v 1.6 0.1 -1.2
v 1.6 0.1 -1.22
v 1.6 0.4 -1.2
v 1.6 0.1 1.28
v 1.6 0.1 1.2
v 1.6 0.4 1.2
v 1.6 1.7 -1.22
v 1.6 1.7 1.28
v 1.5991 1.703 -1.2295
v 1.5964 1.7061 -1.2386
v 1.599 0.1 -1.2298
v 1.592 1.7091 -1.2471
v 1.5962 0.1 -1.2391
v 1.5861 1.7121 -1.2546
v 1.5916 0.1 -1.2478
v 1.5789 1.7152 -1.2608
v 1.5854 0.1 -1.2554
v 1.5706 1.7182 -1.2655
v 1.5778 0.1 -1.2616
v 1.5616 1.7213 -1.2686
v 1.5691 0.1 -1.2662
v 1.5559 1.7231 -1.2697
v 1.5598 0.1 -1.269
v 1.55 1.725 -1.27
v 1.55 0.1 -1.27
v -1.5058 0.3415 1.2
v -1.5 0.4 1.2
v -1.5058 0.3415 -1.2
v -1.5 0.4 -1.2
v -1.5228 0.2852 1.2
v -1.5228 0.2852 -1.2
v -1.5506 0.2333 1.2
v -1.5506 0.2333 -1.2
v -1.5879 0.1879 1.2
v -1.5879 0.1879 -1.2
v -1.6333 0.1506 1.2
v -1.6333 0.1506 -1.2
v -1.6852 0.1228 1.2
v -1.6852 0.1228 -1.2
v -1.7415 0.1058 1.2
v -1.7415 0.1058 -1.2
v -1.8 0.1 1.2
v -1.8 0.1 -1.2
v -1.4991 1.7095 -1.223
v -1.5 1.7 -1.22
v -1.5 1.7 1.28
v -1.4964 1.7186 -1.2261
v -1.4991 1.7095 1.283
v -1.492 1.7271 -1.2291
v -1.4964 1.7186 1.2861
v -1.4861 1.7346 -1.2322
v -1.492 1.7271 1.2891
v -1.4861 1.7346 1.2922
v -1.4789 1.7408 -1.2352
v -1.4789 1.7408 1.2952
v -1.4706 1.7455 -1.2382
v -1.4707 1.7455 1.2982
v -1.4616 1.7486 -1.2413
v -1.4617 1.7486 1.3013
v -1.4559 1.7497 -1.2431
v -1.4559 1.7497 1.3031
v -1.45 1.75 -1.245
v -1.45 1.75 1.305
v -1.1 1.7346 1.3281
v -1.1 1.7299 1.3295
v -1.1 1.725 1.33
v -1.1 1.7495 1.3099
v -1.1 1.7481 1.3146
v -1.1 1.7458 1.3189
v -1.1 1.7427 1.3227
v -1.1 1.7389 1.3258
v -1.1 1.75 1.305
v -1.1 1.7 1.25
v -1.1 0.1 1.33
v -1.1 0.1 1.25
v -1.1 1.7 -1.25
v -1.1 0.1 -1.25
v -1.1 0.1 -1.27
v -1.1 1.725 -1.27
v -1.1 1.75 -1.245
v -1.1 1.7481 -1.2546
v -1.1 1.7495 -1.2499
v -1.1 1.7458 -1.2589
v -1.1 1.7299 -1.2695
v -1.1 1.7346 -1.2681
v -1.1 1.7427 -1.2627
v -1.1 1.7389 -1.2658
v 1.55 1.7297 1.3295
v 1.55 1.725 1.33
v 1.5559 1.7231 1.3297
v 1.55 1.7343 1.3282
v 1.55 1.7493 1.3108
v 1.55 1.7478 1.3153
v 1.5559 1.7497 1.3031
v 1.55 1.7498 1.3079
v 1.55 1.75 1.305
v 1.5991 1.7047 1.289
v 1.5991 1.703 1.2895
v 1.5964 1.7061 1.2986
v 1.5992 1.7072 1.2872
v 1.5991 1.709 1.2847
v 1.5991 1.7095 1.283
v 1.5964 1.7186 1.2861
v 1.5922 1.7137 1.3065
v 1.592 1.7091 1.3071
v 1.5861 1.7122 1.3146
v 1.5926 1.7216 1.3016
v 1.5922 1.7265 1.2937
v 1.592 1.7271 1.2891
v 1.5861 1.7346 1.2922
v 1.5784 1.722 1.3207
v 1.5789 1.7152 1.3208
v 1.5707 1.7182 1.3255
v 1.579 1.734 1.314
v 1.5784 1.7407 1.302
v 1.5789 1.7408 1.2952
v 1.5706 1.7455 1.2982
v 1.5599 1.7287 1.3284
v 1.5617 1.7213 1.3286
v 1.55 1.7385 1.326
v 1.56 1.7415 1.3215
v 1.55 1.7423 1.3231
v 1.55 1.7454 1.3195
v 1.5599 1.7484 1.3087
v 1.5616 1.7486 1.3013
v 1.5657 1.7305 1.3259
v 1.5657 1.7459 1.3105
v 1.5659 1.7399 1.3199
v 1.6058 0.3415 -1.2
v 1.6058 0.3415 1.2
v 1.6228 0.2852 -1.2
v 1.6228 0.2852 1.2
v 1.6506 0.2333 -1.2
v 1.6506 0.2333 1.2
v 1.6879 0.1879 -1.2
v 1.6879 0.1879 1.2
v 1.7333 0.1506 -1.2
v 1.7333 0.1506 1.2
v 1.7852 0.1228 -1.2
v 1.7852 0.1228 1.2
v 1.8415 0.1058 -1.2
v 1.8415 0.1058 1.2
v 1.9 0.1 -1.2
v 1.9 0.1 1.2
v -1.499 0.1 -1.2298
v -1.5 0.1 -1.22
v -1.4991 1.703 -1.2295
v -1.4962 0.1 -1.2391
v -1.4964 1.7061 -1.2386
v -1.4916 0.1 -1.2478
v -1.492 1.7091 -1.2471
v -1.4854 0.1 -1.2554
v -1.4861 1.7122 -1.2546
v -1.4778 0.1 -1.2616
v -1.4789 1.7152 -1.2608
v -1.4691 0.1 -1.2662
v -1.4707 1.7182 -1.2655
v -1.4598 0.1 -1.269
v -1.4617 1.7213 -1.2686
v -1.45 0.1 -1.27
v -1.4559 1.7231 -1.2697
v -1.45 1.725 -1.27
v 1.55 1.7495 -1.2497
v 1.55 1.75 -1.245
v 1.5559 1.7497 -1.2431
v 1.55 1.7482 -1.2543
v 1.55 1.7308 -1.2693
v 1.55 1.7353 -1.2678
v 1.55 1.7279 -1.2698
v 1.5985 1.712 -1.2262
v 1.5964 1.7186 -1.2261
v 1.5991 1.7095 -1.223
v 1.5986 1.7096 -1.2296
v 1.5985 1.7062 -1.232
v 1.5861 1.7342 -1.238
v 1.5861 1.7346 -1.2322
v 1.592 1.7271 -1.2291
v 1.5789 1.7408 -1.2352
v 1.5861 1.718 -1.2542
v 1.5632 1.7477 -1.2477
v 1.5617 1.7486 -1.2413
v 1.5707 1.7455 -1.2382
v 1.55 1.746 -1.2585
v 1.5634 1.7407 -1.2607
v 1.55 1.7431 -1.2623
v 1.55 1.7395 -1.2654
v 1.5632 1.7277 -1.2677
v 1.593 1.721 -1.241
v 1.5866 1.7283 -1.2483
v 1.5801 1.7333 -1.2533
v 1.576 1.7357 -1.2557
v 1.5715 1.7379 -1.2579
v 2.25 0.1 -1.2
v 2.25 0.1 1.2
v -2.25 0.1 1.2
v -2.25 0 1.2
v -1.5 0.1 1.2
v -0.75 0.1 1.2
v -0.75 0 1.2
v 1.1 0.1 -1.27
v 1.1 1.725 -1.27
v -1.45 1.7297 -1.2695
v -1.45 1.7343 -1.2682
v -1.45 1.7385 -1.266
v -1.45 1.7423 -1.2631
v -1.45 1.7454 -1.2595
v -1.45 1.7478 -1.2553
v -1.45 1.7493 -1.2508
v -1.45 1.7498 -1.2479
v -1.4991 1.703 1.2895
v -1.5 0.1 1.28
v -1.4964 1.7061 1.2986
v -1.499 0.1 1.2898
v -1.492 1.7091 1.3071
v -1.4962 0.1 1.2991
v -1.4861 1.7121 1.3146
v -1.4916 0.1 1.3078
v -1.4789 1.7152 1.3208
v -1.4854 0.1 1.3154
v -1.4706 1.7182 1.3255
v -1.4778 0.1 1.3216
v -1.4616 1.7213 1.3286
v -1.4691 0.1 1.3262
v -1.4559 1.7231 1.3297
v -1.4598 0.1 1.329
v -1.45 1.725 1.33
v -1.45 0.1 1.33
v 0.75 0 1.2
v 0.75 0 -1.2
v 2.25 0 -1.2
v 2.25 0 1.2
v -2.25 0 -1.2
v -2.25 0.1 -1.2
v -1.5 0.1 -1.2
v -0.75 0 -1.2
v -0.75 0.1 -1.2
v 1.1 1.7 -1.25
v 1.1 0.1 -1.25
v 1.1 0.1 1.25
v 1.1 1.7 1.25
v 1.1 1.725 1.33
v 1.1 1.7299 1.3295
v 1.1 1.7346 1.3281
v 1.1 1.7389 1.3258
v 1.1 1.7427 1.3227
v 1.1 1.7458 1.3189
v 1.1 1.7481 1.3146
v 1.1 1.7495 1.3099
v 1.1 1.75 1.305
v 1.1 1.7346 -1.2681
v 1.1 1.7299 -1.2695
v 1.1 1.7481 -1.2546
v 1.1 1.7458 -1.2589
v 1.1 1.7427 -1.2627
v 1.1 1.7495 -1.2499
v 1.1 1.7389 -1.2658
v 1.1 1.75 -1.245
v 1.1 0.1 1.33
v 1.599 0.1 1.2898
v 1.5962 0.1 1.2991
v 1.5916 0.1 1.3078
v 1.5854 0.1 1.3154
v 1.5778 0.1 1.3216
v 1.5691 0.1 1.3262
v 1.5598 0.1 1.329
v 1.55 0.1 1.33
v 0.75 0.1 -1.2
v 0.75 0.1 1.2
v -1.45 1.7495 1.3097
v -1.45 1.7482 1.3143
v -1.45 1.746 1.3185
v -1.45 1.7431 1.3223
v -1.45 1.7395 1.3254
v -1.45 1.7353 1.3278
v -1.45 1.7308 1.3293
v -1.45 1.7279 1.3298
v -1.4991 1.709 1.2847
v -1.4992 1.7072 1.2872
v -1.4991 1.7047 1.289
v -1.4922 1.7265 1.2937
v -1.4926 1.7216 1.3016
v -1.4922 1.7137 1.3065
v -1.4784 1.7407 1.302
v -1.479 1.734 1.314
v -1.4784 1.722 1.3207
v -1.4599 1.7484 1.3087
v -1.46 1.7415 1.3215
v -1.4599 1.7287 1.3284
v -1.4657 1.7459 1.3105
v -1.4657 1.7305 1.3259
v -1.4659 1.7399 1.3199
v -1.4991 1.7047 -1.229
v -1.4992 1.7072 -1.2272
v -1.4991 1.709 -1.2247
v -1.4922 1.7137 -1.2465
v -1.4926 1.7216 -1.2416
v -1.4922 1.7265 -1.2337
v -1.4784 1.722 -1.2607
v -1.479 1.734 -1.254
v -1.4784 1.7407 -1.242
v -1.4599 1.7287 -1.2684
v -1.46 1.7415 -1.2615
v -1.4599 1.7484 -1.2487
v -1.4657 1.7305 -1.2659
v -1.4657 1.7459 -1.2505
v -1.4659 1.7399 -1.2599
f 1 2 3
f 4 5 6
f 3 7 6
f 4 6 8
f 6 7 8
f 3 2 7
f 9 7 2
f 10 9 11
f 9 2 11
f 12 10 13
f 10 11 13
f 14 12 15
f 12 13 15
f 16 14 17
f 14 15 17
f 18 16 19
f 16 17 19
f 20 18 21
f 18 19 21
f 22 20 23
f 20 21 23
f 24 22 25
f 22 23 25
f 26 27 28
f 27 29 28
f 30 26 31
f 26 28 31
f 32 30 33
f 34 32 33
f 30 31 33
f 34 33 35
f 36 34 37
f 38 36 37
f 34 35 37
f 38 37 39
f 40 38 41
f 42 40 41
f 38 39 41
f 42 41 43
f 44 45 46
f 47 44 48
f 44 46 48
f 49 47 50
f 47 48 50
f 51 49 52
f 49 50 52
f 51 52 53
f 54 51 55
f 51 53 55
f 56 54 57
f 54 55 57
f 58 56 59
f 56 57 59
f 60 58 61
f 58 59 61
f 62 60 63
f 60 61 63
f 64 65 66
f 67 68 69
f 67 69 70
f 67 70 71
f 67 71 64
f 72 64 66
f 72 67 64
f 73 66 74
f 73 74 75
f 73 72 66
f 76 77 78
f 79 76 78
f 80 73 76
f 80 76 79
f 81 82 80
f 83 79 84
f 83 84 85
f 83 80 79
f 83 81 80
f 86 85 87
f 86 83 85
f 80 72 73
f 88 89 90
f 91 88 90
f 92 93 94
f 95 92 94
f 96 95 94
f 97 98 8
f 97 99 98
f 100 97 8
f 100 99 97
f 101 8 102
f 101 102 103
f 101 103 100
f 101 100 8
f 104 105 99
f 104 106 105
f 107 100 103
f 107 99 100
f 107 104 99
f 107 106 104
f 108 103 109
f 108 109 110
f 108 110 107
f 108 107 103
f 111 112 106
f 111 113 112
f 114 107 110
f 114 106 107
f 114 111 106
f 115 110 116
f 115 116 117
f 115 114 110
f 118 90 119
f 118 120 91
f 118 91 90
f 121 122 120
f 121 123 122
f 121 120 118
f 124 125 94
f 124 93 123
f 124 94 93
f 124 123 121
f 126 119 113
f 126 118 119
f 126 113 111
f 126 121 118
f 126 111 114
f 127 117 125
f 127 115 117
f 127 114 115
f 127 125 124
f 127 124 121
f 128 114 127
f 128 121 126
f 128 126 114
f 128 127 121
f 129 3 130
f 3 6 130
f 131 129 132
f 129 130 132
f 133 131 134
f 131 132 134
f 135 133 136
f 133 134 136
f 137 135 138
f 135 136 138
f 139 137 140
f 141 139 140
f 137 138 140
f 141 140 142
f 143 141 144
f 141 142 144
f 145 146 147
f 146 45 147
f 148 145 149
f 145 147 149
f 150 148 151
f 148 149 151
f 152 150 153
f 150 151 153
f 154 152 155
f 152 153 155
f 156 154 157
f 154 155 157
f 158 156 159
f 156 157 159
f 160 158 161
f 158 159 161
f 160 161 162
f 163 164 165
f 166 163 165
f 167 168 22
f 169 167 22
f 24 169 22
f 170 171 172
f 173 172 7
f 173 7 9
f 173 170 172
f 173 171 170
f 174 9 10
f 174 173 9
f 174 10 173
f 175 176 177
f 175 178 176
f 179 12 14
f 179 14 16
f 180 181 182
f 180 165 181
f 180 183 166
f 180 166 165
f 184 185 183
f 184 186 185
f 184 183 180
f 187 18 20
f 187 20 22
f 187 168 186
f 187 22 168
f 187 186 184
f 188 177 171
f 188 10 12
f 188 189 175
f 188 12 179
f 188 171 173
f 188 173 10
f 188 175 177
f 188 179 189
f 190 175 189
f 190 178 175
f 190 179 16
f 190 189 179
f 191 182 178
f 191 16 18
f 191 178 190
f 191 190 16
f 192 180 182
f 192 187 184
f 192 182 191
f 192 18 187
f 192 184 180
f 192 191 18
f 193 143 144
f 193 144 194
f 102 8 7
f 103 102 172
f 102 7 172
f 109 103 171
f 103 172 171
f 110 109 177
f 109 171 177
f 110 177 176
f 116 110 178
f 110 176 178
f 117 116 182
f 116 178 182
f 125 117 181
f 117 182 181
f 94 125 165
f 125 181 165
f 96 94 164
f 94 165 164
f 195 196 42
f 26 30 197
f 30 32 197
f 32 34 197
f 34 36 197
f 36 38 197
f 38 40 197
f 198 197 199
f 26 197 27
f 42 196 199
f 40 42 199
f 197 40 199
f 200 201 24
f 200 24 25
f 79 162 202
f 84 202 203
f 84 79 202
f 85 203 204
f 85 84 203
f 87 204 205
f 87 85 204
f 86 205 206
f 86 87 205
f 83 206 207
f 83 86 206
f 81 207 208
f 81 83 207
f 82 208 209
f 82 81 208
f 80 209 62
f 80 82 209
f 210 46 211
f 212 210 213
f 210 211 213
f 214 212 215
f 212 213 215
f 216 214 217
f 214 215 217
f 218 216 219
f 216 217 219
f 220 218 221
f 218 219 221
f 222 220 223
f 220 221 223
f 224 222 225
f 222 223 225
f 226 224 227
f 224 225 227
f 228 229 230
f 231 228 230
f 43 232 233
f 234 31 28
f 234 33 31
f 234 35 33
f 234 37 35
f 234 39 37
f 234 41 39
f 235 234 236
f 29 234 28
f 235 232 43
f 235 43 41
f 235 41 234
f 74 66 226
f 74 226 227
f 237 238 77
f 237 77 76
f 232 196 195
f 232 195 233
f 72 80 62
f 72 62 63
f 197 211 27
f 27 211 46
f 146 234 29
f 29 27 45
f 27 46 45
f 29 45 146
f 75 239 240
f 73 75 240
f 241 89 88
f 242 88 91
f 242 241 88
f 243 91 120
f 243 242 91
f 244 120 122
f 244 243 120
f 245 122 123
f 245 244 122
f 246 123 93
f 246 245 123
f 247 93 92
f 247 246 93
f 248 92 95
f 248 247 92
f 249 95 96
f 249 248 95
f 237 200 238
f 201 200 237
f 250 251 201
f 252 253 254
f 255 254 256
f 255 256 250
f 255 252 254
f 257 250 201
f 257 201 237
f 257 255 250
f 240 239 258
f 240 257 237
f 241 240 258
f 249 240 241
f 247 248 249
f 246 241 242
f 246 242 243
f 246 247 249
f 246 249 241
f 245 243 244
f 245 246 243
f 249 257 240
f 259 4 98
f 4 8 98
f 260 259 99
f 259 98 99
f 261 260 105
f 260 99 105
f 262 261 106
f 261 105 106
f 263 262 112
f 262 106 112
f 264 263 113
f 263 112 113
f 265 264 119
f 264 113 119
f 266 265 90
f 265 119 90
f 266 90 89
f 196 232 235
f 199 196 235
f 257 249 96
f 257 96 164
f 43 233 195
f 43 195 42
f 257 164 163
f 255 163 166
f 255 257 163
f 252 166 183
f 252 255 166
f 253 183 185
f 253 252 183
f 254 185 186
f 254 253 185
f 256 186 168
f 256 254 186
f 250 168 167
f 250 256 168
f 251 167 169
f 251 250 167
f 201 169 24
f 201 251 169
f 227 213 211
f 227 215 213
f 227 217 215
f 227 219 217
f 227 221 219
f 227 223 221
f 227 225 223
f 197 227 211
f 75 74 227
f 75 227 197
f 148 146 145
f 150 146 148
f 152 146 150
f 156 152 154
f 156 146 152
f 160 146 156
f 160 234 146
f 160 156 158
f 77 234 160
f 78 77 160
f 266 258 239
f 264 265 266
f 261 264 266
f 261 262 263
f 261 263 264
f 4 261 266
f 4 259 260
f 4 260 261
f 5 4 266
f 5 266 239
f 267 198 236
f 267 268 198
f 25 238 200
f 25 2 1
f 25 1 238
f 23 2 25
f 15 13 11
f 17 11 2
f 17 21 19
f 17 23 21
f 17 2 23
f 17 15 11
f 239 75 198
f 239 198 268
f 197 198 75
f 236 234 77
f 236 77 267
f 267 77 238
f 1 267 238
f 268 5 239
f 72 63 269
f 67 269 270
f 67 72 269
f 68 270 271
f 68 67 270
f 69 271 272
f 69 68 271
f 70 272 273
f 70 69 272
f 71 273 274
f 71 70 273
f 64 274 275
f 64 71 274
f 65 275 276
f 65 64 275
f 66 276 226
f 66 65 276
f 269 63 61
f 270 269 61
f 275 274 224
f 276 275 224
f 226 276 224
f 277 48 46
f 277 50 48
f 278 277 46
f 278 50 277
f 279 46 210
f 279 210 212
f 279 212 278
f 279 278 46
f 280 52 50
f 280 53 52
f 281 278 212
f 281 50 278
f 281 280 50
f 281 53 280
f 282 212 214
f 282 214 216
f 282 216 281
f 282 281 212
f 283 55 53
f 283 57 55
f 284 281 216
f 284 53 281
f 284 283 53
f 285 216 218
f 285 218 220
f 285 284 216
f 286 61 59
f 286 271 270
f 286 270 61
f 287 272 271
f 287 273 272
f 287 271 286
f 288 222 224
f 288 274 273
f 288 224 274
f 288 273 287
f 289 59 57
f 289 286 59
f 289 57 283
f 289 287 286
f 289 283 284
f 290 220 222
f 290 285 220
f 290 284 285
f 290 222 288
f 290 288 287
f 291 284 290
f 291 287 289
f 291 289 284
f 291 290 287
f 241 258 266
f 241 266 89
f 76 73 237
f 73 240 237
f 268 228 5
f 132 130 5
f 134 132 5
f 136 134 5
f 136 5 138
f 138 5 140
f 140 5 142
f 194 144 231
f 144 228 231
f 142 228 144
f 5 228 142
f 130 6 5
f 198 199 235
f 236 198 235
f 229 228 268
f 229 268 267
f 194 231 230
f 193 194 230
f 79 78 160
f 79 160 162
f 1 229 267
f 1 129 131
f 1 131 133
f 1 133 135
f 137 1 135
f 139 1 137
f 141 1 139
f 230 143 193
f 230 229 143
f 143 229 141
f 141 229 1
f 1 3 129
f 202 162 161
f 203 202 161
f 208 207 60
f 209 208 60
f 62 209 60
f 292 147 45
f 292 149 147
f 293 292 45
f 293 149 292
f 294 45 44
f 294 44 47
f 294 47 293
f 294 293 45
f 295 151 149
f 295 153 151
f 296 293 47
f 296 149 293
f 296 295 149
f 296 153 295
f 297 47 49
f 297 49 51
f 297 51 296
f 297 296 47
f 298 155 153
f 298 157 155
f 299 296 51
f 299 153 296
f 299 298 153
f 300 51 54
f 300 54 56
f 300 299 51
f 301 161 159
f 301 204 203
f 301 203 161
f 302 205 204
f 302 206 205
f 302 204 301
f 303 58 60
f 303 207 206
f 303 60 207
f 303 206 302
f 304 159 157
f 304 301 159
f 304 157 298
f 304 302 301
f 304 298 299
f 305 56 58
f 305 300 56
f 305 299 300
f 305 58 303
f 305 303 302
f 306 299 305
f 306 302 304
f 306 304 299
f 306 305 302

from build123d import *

# Parameters (mm, degrees)
SKETCH1_W           = 2.5
SKETCH1_H           = 1.6
BOSS_EXTRUDE1_DEPTH = 1.1
BOSS_EXTRUDE2_DEPTH = 0.5
BOSS_EXTRUDE3_DEPTH = 0.4
SKETCH6_W           = 1.5
SKETCH6_H           = 2.4
BOSS_EXTRUDE4_DEPTH = 0.1
FILLET3_R           = 0.05
FILLET4_R           = 0.3


with BuildPart() as part:
    # Sketch1 → Boss-Extrude1 (new, symmetric)
    with BuildSketch(Plane(origin=(0, 0, 0), x_dir=(0, 0, -1), z_dir=(1, 0, 0))):
        with Locations((0, 0.9)):
            Rectangle(SKETCH1_W, SKETCH1_H)
    extrude(amount=BOSS_EXTRUDE1_DEPTH, both=True)

    # Sketch3 → Boss-Extrude2 (add)
    with BuildSketch(Plane(origin=(1.1, 0, 0), x_dir=(0, 0, -1), z_dir=(1, 0, 0))):
        with BuildLine():
            Line((-1.305, 1.75), (1.245, 1.75))
            ThreePointArc((1.245, 1.75), (1.26267767, 1.74267767), (1.27, 1.725))
            Line((1.27, 1.725), (1.27, 0.1))
            Line((1.27, 0.1), (-1.33, 0.1))
            Line((-1.33, 0.1), (-1.33, 1.725))
            ThreePointArc((-1.33, 1.725), (-1.32267767, 1.74267767), (-1.305, 1.75))
        make_face()
    extrude(amount=BOSS_EXTRUDE2_DEPTH)

    # Sketch5 → Boss-Extrude3 (add)
    with BuildSketch(Plane.ZY.offset(1.1)):
        with BuildLine():
            Line((-1.245, 1.75), (1.305, 1.75))
            ThreePointArc((1.305, 1.75), (1.32267767, 1.74267767), (1.33, 1.725))
            Line((1.33, 1.725), (1.33, 0.1))
            Line((1.33, 0.1), (-1.27, 0.1))
            Line((-1.27, 0.1), (-1.27, 1.725))
            ThreePointArc((-1.27, 1.725), (-1.26267767, 1.74267767), (-1.245, 1.75))
        make_face()
    extrude(amount=BOSS_EXTRUDE3_DEPTH)

    # Sketch6 → Boss-Extrude4 (add)
    with BuildSketch(Plane(origin=(0, 0, 0), x_dir=(1, 0, 0), z_dir=(0, 1, 0))):
        with Locations((-1.5, 0)):
            Rectangle(SKETCH6_W, SKETCH6_H)
        with Locations((1.5, 0)):
            Rectangle(SKETCH6_W, SKETCH6_H)
    extrude(amount=BOSS_EXTRUDE4_DEPTH)

    # Fillet3
    fillet3_edges = [part.edges().sort_by_distance(p)[0] for p in [
        (1.6, 0.9125, -1.27),
        (1.6, 1.74267767, -1.26267767),
        (1.6, 1.75, 0.03),
        (1.6, 1.74267767, 1.32267767),
        (1.6, 0.9125, 1.33),
        (-1.5, 0.9125, 1.33),
        (-1.5, 1.74267767, 1.32267767),
        (-1.5, 1.75, 0.03),
        (-1.5, 1.74267767, -1.26267767),
        (-1.5, 0.9125, -1.27),
    ]]
    fillet(fillet3_edges, radius=FILLET3_R)

    # Fillet4
    fillet4_edges = [part.edges().sort_by_distance(p)[0] for p in [
        (-1.5, 0.1, 0),
        (1.6, 0.1, 0),
    ]]
    fillet(fillet4_edges, radius=FILLET4_R)


solid = part.part
